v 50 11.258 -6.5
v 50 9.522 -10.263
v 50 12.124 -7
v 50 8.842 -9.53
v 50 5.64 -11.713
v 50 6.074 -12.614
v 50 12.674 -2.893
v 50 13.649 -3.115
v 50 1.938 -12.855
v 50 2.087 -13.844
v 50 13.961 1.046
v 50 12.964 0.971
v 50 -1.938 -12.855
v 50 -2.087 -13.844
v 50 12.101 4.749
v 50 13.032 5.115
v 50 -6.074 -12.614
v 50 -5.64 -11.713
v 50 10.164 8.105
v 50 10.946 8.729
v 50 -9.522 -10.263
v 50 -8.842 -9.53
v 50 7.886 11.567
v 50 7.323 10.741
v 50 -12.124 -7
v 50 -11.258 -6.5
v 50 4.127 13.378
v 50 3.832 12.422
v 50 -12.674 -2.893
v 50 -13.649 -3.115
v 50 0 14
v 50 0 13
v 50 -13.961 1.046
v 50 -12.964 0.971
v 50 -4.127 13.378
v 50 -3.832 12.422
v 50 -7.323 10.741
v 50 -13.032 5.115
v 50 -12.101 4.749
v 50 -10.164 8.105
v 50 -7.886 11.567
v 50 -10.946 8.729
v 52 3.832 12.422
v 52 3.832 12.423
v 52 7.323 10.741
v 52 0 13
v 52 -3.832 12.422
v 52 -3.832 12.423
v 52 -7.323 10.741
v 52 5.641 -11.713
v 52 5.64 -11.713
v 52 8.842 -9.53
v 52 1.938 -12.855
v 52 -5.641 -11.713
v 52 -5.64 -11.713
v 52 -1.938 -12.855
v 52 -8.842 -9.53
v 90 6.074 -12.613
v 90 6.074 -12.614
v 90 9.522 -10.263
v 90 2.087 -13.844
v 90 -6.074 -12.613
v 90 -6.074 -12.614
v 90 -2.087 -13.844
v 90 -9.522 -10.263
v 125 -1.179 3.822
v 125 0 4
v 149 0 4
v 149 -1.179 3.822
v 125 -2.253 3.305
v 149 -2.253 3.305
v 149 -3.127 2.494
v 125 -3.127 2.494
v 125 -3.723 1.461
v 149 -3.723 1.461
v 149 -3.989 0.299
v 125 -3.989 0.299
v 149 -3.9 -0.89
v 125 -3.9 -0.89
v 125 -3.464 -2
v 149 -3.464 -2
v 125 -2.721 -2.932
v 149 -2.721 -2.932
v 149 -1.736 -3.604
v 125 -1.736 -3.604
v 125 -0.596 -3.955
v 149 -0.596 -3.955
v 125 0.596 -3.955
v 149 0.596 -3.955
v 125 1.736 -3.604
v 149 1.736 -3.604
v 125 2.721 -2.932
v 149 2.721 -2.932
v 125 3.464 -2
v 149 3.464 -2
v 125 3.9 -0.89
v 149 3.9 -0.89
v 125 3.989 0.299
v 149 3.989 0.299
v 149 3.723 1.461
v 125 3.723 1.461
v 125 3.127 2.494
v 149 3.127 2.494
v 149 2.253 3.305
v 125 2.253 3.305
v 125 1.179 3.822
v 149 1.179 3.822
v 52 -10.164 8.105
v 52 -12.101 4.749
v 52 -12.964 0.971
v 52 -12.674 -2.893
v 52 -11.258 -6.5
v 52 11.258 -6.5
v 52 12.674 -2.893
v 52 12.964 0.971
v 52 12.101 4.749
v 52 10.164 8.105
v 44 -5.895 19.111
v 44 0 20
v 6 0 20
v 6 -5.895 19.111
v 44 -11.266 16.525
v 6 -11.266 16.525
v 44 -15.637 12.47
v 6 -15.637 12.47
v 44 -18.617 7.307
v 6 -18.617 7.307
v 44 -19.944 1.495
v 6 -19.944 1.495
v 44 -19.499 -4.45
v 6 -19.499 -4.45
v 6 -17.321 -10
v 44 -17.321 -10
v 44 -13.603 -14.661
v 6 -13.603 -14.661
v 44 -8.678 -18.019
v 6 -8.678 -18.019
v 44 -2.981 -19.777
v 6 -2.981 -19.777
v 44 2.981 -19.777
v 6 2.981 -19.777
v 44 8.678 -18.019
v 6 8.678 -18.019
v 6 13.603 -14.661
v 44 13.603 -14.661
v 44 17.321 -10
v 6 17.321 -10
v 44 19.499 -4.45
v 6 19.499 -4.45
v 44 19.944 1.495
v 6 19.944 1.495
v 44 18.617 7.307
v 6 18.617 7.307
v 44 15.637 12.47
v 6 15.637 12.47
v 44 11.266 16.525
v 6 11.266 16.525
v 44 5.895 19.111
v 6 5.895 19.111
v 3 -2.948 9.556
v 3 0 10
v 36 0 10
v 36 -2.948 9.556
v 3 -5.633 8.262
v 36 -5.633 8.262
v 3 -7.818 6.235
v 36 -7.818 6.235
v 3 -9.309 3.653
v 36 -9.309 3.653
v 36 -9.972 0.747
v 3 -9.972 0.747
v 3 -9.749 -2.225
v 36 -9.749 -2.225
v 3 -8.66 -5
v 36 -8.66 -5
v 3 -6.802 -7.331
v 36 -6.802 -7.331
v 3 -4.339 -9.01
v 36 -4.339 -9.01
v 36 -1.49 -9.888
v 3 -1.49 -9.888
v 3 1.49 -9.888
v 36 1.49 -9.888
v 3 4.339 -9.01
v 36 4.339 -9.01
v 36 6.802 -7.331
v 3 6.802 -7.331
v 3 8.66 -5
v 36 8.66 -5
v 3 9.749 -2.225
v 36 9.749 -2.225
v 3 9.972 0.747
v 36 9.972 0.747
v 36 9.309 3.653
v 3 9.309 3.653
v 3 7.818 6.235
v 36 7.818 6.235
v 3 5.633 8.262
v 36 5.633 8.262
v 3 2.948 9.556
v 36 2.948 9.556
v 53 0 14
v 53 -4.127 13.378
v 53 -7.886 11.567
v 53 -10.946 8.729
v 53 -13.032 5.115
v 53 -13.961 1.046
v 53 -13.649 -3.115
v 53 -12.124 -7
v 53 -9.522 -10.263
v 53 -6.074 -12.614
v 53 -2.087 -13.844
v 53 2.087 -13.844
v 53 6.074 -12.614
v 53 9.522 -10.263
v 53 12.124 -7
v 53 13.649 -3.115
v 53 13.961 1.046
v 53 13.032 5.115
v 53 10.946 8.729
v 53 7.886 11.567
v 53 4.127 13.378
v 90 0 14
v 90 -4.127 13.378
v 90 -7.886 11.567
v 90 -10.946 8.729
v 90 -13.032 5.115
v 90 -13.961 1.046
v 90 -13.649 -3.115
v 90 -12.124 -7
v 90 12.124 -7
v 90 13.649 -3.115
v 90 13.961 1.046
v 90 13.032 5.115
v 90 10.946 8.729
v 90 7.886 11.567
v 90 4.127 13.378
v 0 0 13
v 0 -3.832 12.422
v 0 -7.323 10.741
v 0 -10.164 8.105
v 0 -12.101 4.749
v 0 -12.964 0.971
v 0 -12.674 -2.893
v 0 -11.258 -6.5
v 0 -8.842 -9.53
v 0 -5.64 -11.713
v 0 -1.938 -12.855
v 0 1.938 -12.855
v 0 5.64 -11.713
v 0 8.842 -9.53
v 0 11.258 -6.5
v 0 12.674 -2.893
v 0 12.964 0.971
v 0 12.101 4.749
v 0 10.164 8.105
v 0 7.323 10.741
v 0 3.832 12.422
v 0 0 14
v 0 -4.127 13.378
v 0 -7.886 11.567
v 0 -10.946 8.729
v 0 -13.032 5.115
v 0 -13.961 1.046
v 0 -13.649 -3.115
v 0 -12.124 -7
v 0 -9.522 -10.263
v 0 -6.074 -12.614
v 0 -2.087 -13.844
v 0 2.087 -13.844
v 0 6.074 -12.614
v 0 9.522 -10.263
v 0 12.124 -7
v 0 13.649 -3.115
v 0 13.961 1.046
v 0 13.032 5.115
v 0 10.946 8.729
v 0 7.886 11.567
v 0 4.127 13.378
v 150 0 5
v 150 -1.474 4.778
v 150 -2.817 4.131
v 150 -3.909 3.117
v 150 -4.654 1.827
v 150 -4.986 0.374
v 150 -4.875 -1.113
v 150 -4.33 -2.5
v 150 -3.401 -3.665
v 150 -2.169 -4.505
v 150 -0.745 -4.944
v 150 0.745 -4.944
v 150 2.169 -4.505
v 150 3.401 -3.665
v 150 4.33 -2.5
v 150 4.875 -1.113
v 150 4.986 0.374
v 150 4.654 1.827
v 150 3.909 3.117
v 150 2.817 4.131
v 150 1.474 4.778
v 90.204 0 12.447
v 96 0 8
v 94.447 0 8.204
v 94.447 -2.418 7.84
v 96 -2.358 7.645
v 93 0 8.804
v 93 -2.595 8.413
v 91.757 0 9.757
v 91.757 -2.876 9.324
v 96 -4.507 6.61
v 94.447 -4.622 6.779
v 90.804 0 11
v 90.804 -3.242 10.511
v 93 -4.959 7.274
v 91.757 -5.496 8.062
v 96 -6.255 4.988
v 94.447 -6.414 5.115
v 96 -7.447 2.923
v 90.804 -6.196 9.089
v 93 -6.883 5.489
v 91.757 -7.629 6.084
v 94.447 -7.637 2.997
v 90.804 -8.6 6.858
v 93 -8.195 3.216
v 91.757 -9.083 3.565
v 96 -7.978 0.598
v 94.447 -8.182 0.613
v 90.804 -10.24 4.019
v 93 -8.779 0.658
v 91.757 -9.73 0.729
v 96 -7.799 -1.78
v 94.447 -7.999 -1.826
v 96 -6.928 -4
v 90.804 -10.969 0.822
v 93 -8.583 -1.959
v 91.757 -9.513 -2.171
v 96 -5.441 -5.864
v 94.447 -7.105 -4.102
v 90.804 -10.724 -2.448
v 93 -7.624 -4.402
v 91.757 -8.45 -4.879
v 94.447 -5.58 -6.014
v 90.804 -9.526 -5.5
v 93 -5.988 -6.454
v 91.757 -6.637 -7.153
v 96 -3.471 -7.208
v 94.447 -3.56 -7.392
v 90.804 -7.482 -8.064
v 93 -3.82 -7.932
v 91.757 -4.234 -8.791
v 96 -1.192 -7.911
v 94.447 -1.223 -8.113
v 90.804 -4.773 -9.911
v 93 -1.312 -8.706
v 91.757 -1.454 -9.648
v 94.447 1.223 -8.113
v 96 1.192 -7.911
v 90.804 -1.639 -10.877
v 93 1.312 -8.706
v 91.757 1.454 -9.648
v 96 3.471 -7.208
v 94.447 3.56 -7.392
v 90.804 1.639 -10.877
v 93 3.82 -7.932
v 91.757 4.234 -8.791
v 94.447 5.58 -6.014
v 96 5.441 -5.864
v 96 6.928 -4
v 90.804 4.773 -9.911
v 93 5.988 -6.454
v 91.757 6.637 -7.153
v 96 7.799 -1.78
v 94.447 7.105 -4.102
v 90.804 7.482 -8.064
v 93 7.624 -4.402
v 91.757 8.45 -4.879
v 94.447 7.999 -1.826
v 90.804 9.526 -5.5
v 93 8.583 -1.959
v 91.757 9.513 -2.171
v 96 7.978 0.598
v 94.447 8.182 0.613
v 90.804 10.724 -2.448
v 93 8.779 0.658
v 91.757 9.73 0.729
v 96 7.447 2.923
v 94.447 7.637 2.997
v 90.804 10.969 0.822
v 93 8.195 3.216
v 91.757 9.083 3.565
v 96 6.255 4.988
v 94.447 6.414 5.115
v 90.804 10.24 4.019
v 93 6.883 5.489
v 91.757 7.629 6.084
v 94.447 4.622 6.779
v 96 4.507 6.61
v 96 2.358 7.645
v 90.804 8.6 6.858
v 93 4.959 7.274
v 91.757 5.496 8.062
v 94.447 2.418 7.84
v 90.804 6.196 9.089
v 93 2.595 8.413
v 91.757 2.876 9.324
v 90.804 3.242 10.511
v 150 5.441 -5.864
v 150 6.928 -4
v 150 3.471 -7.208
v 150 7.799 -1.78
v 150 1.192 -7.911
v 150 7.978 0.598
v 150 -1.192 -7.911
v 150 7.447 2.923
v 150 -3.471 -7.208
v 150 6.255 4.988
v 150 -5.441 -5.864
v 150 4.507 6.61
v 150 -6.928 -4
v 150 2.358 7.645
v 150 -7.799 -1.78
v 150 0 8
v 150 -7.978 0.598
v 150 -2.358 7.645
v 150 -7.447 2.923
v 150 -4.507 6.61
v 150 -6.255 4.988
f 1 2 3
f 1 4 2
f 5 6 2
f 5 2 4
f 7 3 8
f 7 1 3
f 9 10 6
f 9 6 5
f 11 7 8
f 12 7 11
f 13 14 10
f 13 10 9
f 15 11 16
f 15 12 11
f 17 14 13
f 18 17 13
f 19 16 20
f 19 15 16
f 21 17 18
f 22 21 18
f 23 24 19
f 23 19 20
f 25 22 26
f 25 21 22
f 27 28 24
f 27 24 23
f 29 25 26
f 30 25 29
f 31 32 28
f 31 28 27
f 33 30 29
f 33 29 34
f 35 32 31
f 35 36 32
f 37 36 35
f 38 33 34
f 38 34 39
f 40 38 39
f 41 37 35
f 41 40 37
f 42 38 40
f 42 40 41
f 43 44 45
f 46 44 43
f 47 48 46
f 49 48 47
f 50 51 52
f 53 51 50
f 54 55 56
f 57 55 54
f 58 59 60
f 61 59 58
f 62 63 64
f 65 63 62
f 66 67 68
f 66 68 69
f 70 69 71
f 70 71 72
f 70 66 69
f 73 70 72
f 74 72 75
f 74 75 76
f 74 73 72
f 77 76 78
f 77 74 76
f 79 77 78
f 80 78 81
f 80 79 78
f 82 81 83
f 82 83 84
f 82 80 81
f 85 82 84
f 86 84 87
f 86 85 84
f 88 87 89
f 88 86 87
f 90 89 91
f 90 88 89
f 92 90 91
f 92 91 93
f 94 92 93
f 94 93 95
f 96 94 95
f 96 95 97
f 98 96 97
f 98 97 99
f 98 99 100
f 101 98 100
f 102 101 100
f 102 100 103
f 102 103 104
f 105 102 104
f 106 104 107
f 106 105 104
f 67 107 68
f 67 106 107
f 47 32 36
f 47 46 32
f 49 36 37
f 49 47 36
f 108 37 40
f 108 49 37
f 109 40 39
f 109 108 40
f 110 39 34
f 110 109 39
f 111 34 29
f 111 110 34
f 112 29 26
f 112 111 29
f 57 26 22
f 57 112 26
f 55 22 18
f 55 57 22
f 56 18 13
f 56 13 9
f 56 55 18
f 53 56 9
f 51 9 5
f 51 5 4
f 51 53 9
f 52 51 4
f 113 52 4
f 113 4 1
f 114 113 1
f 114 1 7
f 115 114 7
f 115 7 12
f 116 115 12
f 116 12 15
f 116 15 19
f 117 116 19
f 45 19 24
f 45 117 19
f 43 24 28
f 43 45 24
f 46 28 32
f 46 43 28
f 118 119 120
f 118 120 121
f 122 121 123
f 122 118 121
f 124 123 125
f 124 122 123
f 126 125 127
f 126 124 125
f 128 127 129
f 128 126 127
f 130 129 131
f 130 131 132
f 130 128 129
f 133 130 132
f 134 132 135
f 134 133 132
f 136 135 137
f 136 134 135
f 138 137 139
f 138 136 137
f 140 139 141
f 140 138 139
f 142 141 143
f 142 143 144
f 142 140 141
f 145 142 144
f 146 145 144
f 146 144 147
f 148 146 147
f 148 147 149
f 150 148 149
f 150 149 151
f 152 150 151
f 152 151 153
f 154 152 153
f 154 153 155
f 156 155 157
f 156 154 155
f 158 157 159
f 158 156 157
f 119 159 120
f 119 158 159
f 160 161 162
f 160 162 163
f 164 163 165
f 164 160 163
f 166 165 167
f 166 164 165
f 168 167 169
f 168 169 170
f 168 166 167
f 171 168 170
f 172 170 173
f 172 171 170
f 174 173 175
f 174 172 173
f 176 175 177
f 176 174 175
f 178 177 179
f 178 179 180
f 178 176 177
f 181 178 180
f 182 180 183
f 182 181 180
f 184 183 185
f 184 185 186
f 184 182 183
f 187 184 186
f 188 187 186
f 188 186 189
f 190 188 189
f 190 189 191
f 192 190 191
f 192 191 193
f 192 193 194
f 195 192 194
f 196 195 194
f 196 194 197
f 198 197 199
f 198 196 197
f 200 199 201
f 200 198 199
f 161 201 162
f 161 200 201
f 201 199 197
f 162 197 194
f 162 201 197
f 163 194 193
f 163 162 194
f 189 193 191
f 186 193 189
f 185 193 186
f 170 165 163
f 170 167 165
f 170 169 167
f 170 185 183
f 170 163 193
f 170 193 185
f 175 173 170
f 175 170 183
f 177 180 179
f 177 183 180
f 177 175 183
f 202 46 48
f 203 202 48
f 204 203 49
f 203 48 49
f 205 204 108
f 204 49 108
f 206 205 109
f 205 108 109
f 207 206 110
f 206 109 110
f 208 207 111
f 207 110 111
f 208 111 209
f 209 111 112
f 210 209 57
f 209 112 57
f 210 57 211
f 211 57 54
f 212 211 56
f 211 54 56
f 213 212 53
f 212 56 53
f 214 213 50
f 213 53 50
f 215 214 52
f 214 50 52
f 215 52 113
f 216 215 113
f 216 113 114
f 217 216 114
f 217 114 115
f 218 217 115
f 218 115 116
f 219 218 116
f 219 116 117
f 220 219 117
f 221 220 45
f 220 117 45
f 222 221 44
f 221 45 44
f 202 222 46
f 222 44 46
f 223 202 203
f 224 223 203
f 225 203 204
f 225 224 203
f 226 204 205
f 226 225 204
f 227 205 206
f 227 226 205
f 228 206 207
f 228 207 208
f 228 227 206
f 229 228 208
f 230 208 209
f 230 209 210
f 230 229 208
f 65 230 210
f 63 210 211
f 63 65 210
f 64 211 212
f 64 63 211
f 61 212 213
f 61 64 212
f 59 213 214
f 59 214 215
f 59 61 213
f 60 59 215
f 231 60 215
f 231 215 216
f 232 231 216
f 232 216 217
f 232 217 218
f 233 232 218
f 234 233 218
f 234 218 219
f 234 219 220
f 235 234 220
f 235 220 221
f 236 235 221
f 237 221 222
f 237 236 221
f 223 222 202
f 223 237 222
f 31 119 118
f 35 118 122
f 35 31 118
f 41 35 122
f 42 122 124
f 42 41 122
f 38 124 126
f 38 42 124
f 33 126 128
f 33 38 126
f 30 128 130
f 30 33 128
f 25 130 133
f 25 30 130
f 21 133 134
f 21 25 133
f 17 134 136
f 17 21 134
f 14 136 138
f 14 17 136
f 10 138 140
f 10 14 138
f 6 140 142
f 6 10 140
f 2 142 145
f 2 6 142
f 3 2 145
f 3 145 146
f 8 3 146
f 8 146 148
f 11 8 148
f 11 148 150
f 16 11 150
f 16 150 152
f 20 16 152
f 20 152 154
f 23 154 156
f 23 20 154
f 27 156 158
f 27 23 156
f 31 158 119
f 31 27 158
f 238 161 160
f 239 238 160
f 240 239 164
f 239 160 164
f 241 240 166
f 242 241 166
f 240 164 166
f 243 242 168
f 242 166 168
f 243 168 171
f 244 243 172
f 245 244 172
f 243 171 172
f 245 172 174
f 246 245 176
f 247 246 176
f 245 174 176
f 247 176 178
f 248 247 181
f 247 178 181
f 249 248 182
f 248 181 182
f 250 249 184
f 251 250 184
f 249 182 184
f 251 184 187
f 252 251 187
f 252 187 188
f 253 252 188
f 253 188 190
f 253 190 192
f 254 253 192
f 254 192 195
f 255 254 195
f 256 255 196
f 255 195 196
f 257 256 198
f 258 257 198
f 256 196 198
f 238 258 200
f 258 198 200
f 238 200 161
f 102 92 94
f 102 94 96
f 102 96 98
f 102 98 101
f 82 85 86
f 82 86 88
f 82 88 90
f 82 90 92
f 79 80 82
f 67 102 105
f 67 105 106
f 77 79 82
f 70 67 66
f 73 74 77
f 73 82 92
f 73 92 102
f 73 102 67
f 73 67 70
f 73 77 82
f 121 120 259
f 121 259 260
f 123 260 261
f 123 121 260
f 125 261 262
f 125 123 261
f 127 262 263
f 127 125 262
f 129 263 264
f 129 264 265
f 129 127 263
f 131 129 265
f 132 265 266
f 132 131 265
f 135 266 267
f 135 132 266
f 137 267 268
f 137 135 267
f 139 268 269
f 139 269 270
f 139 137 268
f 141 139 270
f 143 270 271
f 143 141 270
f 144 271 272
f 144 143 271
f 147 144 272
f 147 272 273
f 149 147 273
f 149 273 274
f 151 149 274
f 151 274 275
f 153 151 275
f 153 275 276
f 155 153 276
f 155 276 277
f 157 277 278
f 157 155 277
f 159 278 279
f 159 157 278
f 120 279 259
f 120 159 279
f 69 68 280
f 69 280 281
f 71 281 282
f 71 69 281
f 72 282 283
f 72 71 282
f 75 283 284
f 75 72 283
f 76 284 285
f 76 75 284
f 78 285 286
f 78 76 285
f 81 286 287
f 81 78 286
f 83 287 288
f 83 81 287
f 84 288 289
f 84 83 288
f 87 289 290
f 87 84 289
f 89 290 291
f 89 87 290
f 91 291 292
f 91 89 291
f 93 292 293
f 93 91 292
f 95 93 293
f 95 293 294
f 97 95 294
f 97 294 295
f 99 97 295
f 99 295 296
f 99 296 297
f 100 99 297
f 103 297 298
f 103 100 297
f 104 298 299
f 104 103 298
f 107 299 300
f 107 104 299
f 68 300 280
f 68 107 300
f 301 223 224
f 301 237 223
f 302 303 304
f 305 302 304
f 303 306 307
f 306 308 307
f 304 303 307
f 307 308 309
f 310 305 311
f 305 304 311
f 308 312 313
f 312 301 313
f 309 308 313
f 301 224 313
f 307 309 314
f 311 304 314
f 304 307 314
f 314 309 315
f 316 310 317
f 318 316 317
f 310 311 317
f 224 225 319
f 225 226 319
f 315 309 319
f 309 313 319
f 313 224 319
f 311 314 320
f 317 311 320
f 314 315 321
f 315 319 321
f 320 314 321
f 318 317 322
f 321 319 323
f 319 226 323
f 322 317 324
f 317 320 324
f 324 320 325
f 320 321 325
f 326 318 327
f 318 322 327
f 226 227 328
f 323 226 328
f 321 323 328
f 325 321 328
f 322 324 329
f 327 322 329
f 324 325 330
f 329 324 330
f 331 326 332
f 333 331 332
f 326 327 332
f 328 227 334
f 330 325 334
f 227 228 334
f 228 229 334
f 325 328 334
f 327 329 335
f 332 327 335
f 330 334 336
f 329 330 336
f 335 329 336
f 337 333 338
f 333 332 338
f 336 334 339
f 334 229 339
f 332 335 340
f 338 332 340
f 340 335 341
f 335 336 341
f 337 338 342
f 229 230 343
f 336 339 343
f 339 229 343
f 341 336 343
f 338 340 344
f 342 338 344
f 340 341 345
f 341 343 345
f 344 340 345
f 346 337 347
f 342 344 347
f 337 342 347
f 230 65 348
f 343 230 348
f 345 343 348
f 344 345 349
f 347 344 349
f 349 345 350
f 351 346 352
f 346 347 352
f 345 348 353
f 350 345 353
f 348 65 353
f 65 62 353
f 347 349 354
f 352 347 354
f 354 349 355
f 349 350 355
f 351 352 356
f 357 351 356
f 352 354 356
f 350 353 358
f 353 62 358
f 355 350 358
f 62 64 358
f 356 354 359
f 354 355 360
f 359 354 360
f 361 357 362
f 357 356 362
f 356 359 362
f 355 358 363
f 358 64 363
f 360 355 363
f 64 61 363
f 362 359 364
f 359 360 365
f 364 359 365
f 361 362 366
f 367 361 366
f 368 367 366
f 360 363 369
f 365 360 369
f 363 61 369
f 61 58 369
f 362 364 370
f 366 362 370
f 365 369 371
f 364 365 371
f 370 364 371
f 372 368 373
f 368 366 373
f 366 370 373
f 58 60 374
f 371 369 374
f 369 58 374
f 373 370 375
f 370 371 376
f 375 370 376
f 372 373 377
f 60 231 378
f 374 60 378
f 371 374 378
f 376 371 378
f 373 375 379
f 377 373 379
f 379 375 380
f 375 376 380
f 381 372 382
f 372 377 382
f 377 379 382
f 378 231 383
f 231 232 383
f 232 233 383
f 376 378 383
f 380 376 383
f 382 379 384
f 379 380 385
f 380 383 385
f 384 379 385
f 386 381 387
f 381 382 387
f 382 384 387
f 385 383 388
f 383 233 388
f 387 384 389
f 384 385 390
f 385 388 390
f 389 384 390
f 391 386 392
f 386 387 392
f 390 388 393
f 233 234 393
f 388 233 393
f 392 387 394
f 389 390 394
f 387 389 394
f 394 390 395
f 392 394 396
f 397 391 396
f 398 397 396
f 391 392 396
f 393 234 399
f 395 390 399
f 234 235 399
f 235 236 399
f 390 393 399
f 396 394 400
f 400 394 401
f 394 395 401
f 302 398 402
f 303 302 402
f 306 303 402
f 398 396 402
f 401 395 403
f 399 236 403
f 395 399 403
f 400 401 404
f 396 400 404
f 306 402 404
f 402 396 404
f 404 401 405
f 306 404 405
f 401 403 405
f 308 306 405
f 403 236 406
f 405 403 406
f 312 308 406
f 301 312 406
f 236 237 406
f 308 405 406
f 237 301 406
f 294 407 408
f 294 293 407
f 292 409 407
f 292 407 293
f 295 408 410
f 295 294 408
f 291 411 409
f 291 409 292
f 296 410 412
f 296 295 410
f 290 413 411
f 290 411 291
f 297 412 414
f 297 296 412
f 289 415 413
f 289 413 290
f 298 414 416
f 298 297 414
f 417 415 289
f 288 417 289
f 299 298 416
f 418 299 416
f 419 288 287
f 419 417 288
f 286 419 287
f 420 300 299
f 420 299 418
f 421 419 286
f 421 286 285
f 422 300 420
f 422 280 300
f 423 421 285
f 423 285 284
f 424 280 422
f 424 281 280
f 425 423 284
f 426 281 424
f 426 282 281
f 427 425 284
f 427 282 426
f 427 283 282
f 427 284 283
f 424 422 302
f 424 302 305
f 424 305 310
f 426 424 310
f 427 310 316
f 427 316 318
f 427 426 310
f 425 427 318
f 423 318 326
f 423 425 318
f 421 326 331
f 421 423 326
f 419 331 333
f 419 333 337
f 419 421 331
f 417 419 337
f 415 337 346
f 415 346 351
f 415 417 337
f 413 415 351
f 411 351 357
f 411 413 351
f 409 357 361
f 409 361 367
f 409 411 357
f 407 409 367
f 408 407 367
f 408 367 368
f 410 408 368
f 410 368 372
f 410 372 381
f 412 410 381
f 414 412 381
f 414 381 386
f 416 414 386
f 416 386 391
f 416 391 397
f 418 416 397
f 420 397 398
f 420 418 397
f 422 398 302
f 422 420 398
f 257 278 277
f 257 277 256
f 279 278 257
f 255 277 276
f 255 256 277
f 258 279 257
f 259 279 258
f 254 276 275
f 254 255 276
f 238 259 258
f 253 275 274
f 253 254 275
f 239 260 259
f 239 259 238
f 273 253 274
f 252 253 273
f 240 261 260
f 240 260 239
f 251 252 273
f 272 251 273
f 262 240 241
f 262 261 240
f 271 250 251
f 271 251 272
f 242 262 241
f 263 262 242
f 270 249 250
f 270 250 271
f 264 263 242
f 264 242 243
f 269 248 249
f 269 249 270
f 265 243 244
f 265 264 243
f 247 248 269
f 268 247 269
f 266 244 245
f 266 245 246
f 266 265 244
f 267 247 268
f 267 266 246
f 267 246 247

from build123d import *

# Parameters (mm, degrees)
CHAMFER2_SIZE = 6
CHAMFER3_SIZE = 3
CHAMFER4_SIZE = 1
FILLET1_R     = 6
CHAMFER5_SIZE = 1


with BuildPart() as part:
    # Sketch1 → Revolve2 (revolve)
    with BuildSketch(Plane.XY, mode=Mode.PRIVATE) as revolve2_sk:
        Polygon((0, -10), (0, -20), (50, -20), (50, -13), (52, -13), (52, -14), (90, -14), (90, -8), (150, -8), (150, -4), (125, -4), (125, 0), (36, 0), (36, -10), align=None)
    revolve(revolve2_sk.sketch.rotate(Axis((0, 0, 0), (1, 0, 0)), 270), axis=Axis((0, 0, 0), (1, 0, 0)))

    # Chamfer2
    chamfer2_edges = [part.edges().sort_by_distance(p)[0] for p in [
        (0, 0, -20),
        (50, 0, -20),
    ]]
    chamfer(chamfer2_edges, length=CHAMFER2_SIZE)

    # Chamfer3
    chamfer3_edges = [part.edges().sort_by_distance(p)[0] for p in [
        (0, 0, -10),
    ]]
    chamfer(chamfer3_edges, length=CHAMFER3_SIZE)

    # Chamfer4
    chamfer4_edges = [part.edges().sort_by_distance(p)[0] for p in [
        (150, 0, -4),
    ]]
    chamfer(chamfer4_edges, length=CHAMFER4_SIZE)

    # Fillet1
    fillet1_edges = [part.edges().sort_by_distance(p)[0] for p in [
        (90, 0, -8),
    ]]
    fillet(fillet1_edges, radius=FILLET1_R - 0.0001)  # a hair under: the kernel refuses the full size

    # Chamfer5
    chamfer5_edges = [part.edges().sort_by_distance(p)[0] for p in [
        (52, 0, -14),
    ]]
    chamfer(chamfer5_edges, length=CHAMFER5_SIZE - 0.0001)  # a hair under: the kernel refuses the full size


solid = part.part
